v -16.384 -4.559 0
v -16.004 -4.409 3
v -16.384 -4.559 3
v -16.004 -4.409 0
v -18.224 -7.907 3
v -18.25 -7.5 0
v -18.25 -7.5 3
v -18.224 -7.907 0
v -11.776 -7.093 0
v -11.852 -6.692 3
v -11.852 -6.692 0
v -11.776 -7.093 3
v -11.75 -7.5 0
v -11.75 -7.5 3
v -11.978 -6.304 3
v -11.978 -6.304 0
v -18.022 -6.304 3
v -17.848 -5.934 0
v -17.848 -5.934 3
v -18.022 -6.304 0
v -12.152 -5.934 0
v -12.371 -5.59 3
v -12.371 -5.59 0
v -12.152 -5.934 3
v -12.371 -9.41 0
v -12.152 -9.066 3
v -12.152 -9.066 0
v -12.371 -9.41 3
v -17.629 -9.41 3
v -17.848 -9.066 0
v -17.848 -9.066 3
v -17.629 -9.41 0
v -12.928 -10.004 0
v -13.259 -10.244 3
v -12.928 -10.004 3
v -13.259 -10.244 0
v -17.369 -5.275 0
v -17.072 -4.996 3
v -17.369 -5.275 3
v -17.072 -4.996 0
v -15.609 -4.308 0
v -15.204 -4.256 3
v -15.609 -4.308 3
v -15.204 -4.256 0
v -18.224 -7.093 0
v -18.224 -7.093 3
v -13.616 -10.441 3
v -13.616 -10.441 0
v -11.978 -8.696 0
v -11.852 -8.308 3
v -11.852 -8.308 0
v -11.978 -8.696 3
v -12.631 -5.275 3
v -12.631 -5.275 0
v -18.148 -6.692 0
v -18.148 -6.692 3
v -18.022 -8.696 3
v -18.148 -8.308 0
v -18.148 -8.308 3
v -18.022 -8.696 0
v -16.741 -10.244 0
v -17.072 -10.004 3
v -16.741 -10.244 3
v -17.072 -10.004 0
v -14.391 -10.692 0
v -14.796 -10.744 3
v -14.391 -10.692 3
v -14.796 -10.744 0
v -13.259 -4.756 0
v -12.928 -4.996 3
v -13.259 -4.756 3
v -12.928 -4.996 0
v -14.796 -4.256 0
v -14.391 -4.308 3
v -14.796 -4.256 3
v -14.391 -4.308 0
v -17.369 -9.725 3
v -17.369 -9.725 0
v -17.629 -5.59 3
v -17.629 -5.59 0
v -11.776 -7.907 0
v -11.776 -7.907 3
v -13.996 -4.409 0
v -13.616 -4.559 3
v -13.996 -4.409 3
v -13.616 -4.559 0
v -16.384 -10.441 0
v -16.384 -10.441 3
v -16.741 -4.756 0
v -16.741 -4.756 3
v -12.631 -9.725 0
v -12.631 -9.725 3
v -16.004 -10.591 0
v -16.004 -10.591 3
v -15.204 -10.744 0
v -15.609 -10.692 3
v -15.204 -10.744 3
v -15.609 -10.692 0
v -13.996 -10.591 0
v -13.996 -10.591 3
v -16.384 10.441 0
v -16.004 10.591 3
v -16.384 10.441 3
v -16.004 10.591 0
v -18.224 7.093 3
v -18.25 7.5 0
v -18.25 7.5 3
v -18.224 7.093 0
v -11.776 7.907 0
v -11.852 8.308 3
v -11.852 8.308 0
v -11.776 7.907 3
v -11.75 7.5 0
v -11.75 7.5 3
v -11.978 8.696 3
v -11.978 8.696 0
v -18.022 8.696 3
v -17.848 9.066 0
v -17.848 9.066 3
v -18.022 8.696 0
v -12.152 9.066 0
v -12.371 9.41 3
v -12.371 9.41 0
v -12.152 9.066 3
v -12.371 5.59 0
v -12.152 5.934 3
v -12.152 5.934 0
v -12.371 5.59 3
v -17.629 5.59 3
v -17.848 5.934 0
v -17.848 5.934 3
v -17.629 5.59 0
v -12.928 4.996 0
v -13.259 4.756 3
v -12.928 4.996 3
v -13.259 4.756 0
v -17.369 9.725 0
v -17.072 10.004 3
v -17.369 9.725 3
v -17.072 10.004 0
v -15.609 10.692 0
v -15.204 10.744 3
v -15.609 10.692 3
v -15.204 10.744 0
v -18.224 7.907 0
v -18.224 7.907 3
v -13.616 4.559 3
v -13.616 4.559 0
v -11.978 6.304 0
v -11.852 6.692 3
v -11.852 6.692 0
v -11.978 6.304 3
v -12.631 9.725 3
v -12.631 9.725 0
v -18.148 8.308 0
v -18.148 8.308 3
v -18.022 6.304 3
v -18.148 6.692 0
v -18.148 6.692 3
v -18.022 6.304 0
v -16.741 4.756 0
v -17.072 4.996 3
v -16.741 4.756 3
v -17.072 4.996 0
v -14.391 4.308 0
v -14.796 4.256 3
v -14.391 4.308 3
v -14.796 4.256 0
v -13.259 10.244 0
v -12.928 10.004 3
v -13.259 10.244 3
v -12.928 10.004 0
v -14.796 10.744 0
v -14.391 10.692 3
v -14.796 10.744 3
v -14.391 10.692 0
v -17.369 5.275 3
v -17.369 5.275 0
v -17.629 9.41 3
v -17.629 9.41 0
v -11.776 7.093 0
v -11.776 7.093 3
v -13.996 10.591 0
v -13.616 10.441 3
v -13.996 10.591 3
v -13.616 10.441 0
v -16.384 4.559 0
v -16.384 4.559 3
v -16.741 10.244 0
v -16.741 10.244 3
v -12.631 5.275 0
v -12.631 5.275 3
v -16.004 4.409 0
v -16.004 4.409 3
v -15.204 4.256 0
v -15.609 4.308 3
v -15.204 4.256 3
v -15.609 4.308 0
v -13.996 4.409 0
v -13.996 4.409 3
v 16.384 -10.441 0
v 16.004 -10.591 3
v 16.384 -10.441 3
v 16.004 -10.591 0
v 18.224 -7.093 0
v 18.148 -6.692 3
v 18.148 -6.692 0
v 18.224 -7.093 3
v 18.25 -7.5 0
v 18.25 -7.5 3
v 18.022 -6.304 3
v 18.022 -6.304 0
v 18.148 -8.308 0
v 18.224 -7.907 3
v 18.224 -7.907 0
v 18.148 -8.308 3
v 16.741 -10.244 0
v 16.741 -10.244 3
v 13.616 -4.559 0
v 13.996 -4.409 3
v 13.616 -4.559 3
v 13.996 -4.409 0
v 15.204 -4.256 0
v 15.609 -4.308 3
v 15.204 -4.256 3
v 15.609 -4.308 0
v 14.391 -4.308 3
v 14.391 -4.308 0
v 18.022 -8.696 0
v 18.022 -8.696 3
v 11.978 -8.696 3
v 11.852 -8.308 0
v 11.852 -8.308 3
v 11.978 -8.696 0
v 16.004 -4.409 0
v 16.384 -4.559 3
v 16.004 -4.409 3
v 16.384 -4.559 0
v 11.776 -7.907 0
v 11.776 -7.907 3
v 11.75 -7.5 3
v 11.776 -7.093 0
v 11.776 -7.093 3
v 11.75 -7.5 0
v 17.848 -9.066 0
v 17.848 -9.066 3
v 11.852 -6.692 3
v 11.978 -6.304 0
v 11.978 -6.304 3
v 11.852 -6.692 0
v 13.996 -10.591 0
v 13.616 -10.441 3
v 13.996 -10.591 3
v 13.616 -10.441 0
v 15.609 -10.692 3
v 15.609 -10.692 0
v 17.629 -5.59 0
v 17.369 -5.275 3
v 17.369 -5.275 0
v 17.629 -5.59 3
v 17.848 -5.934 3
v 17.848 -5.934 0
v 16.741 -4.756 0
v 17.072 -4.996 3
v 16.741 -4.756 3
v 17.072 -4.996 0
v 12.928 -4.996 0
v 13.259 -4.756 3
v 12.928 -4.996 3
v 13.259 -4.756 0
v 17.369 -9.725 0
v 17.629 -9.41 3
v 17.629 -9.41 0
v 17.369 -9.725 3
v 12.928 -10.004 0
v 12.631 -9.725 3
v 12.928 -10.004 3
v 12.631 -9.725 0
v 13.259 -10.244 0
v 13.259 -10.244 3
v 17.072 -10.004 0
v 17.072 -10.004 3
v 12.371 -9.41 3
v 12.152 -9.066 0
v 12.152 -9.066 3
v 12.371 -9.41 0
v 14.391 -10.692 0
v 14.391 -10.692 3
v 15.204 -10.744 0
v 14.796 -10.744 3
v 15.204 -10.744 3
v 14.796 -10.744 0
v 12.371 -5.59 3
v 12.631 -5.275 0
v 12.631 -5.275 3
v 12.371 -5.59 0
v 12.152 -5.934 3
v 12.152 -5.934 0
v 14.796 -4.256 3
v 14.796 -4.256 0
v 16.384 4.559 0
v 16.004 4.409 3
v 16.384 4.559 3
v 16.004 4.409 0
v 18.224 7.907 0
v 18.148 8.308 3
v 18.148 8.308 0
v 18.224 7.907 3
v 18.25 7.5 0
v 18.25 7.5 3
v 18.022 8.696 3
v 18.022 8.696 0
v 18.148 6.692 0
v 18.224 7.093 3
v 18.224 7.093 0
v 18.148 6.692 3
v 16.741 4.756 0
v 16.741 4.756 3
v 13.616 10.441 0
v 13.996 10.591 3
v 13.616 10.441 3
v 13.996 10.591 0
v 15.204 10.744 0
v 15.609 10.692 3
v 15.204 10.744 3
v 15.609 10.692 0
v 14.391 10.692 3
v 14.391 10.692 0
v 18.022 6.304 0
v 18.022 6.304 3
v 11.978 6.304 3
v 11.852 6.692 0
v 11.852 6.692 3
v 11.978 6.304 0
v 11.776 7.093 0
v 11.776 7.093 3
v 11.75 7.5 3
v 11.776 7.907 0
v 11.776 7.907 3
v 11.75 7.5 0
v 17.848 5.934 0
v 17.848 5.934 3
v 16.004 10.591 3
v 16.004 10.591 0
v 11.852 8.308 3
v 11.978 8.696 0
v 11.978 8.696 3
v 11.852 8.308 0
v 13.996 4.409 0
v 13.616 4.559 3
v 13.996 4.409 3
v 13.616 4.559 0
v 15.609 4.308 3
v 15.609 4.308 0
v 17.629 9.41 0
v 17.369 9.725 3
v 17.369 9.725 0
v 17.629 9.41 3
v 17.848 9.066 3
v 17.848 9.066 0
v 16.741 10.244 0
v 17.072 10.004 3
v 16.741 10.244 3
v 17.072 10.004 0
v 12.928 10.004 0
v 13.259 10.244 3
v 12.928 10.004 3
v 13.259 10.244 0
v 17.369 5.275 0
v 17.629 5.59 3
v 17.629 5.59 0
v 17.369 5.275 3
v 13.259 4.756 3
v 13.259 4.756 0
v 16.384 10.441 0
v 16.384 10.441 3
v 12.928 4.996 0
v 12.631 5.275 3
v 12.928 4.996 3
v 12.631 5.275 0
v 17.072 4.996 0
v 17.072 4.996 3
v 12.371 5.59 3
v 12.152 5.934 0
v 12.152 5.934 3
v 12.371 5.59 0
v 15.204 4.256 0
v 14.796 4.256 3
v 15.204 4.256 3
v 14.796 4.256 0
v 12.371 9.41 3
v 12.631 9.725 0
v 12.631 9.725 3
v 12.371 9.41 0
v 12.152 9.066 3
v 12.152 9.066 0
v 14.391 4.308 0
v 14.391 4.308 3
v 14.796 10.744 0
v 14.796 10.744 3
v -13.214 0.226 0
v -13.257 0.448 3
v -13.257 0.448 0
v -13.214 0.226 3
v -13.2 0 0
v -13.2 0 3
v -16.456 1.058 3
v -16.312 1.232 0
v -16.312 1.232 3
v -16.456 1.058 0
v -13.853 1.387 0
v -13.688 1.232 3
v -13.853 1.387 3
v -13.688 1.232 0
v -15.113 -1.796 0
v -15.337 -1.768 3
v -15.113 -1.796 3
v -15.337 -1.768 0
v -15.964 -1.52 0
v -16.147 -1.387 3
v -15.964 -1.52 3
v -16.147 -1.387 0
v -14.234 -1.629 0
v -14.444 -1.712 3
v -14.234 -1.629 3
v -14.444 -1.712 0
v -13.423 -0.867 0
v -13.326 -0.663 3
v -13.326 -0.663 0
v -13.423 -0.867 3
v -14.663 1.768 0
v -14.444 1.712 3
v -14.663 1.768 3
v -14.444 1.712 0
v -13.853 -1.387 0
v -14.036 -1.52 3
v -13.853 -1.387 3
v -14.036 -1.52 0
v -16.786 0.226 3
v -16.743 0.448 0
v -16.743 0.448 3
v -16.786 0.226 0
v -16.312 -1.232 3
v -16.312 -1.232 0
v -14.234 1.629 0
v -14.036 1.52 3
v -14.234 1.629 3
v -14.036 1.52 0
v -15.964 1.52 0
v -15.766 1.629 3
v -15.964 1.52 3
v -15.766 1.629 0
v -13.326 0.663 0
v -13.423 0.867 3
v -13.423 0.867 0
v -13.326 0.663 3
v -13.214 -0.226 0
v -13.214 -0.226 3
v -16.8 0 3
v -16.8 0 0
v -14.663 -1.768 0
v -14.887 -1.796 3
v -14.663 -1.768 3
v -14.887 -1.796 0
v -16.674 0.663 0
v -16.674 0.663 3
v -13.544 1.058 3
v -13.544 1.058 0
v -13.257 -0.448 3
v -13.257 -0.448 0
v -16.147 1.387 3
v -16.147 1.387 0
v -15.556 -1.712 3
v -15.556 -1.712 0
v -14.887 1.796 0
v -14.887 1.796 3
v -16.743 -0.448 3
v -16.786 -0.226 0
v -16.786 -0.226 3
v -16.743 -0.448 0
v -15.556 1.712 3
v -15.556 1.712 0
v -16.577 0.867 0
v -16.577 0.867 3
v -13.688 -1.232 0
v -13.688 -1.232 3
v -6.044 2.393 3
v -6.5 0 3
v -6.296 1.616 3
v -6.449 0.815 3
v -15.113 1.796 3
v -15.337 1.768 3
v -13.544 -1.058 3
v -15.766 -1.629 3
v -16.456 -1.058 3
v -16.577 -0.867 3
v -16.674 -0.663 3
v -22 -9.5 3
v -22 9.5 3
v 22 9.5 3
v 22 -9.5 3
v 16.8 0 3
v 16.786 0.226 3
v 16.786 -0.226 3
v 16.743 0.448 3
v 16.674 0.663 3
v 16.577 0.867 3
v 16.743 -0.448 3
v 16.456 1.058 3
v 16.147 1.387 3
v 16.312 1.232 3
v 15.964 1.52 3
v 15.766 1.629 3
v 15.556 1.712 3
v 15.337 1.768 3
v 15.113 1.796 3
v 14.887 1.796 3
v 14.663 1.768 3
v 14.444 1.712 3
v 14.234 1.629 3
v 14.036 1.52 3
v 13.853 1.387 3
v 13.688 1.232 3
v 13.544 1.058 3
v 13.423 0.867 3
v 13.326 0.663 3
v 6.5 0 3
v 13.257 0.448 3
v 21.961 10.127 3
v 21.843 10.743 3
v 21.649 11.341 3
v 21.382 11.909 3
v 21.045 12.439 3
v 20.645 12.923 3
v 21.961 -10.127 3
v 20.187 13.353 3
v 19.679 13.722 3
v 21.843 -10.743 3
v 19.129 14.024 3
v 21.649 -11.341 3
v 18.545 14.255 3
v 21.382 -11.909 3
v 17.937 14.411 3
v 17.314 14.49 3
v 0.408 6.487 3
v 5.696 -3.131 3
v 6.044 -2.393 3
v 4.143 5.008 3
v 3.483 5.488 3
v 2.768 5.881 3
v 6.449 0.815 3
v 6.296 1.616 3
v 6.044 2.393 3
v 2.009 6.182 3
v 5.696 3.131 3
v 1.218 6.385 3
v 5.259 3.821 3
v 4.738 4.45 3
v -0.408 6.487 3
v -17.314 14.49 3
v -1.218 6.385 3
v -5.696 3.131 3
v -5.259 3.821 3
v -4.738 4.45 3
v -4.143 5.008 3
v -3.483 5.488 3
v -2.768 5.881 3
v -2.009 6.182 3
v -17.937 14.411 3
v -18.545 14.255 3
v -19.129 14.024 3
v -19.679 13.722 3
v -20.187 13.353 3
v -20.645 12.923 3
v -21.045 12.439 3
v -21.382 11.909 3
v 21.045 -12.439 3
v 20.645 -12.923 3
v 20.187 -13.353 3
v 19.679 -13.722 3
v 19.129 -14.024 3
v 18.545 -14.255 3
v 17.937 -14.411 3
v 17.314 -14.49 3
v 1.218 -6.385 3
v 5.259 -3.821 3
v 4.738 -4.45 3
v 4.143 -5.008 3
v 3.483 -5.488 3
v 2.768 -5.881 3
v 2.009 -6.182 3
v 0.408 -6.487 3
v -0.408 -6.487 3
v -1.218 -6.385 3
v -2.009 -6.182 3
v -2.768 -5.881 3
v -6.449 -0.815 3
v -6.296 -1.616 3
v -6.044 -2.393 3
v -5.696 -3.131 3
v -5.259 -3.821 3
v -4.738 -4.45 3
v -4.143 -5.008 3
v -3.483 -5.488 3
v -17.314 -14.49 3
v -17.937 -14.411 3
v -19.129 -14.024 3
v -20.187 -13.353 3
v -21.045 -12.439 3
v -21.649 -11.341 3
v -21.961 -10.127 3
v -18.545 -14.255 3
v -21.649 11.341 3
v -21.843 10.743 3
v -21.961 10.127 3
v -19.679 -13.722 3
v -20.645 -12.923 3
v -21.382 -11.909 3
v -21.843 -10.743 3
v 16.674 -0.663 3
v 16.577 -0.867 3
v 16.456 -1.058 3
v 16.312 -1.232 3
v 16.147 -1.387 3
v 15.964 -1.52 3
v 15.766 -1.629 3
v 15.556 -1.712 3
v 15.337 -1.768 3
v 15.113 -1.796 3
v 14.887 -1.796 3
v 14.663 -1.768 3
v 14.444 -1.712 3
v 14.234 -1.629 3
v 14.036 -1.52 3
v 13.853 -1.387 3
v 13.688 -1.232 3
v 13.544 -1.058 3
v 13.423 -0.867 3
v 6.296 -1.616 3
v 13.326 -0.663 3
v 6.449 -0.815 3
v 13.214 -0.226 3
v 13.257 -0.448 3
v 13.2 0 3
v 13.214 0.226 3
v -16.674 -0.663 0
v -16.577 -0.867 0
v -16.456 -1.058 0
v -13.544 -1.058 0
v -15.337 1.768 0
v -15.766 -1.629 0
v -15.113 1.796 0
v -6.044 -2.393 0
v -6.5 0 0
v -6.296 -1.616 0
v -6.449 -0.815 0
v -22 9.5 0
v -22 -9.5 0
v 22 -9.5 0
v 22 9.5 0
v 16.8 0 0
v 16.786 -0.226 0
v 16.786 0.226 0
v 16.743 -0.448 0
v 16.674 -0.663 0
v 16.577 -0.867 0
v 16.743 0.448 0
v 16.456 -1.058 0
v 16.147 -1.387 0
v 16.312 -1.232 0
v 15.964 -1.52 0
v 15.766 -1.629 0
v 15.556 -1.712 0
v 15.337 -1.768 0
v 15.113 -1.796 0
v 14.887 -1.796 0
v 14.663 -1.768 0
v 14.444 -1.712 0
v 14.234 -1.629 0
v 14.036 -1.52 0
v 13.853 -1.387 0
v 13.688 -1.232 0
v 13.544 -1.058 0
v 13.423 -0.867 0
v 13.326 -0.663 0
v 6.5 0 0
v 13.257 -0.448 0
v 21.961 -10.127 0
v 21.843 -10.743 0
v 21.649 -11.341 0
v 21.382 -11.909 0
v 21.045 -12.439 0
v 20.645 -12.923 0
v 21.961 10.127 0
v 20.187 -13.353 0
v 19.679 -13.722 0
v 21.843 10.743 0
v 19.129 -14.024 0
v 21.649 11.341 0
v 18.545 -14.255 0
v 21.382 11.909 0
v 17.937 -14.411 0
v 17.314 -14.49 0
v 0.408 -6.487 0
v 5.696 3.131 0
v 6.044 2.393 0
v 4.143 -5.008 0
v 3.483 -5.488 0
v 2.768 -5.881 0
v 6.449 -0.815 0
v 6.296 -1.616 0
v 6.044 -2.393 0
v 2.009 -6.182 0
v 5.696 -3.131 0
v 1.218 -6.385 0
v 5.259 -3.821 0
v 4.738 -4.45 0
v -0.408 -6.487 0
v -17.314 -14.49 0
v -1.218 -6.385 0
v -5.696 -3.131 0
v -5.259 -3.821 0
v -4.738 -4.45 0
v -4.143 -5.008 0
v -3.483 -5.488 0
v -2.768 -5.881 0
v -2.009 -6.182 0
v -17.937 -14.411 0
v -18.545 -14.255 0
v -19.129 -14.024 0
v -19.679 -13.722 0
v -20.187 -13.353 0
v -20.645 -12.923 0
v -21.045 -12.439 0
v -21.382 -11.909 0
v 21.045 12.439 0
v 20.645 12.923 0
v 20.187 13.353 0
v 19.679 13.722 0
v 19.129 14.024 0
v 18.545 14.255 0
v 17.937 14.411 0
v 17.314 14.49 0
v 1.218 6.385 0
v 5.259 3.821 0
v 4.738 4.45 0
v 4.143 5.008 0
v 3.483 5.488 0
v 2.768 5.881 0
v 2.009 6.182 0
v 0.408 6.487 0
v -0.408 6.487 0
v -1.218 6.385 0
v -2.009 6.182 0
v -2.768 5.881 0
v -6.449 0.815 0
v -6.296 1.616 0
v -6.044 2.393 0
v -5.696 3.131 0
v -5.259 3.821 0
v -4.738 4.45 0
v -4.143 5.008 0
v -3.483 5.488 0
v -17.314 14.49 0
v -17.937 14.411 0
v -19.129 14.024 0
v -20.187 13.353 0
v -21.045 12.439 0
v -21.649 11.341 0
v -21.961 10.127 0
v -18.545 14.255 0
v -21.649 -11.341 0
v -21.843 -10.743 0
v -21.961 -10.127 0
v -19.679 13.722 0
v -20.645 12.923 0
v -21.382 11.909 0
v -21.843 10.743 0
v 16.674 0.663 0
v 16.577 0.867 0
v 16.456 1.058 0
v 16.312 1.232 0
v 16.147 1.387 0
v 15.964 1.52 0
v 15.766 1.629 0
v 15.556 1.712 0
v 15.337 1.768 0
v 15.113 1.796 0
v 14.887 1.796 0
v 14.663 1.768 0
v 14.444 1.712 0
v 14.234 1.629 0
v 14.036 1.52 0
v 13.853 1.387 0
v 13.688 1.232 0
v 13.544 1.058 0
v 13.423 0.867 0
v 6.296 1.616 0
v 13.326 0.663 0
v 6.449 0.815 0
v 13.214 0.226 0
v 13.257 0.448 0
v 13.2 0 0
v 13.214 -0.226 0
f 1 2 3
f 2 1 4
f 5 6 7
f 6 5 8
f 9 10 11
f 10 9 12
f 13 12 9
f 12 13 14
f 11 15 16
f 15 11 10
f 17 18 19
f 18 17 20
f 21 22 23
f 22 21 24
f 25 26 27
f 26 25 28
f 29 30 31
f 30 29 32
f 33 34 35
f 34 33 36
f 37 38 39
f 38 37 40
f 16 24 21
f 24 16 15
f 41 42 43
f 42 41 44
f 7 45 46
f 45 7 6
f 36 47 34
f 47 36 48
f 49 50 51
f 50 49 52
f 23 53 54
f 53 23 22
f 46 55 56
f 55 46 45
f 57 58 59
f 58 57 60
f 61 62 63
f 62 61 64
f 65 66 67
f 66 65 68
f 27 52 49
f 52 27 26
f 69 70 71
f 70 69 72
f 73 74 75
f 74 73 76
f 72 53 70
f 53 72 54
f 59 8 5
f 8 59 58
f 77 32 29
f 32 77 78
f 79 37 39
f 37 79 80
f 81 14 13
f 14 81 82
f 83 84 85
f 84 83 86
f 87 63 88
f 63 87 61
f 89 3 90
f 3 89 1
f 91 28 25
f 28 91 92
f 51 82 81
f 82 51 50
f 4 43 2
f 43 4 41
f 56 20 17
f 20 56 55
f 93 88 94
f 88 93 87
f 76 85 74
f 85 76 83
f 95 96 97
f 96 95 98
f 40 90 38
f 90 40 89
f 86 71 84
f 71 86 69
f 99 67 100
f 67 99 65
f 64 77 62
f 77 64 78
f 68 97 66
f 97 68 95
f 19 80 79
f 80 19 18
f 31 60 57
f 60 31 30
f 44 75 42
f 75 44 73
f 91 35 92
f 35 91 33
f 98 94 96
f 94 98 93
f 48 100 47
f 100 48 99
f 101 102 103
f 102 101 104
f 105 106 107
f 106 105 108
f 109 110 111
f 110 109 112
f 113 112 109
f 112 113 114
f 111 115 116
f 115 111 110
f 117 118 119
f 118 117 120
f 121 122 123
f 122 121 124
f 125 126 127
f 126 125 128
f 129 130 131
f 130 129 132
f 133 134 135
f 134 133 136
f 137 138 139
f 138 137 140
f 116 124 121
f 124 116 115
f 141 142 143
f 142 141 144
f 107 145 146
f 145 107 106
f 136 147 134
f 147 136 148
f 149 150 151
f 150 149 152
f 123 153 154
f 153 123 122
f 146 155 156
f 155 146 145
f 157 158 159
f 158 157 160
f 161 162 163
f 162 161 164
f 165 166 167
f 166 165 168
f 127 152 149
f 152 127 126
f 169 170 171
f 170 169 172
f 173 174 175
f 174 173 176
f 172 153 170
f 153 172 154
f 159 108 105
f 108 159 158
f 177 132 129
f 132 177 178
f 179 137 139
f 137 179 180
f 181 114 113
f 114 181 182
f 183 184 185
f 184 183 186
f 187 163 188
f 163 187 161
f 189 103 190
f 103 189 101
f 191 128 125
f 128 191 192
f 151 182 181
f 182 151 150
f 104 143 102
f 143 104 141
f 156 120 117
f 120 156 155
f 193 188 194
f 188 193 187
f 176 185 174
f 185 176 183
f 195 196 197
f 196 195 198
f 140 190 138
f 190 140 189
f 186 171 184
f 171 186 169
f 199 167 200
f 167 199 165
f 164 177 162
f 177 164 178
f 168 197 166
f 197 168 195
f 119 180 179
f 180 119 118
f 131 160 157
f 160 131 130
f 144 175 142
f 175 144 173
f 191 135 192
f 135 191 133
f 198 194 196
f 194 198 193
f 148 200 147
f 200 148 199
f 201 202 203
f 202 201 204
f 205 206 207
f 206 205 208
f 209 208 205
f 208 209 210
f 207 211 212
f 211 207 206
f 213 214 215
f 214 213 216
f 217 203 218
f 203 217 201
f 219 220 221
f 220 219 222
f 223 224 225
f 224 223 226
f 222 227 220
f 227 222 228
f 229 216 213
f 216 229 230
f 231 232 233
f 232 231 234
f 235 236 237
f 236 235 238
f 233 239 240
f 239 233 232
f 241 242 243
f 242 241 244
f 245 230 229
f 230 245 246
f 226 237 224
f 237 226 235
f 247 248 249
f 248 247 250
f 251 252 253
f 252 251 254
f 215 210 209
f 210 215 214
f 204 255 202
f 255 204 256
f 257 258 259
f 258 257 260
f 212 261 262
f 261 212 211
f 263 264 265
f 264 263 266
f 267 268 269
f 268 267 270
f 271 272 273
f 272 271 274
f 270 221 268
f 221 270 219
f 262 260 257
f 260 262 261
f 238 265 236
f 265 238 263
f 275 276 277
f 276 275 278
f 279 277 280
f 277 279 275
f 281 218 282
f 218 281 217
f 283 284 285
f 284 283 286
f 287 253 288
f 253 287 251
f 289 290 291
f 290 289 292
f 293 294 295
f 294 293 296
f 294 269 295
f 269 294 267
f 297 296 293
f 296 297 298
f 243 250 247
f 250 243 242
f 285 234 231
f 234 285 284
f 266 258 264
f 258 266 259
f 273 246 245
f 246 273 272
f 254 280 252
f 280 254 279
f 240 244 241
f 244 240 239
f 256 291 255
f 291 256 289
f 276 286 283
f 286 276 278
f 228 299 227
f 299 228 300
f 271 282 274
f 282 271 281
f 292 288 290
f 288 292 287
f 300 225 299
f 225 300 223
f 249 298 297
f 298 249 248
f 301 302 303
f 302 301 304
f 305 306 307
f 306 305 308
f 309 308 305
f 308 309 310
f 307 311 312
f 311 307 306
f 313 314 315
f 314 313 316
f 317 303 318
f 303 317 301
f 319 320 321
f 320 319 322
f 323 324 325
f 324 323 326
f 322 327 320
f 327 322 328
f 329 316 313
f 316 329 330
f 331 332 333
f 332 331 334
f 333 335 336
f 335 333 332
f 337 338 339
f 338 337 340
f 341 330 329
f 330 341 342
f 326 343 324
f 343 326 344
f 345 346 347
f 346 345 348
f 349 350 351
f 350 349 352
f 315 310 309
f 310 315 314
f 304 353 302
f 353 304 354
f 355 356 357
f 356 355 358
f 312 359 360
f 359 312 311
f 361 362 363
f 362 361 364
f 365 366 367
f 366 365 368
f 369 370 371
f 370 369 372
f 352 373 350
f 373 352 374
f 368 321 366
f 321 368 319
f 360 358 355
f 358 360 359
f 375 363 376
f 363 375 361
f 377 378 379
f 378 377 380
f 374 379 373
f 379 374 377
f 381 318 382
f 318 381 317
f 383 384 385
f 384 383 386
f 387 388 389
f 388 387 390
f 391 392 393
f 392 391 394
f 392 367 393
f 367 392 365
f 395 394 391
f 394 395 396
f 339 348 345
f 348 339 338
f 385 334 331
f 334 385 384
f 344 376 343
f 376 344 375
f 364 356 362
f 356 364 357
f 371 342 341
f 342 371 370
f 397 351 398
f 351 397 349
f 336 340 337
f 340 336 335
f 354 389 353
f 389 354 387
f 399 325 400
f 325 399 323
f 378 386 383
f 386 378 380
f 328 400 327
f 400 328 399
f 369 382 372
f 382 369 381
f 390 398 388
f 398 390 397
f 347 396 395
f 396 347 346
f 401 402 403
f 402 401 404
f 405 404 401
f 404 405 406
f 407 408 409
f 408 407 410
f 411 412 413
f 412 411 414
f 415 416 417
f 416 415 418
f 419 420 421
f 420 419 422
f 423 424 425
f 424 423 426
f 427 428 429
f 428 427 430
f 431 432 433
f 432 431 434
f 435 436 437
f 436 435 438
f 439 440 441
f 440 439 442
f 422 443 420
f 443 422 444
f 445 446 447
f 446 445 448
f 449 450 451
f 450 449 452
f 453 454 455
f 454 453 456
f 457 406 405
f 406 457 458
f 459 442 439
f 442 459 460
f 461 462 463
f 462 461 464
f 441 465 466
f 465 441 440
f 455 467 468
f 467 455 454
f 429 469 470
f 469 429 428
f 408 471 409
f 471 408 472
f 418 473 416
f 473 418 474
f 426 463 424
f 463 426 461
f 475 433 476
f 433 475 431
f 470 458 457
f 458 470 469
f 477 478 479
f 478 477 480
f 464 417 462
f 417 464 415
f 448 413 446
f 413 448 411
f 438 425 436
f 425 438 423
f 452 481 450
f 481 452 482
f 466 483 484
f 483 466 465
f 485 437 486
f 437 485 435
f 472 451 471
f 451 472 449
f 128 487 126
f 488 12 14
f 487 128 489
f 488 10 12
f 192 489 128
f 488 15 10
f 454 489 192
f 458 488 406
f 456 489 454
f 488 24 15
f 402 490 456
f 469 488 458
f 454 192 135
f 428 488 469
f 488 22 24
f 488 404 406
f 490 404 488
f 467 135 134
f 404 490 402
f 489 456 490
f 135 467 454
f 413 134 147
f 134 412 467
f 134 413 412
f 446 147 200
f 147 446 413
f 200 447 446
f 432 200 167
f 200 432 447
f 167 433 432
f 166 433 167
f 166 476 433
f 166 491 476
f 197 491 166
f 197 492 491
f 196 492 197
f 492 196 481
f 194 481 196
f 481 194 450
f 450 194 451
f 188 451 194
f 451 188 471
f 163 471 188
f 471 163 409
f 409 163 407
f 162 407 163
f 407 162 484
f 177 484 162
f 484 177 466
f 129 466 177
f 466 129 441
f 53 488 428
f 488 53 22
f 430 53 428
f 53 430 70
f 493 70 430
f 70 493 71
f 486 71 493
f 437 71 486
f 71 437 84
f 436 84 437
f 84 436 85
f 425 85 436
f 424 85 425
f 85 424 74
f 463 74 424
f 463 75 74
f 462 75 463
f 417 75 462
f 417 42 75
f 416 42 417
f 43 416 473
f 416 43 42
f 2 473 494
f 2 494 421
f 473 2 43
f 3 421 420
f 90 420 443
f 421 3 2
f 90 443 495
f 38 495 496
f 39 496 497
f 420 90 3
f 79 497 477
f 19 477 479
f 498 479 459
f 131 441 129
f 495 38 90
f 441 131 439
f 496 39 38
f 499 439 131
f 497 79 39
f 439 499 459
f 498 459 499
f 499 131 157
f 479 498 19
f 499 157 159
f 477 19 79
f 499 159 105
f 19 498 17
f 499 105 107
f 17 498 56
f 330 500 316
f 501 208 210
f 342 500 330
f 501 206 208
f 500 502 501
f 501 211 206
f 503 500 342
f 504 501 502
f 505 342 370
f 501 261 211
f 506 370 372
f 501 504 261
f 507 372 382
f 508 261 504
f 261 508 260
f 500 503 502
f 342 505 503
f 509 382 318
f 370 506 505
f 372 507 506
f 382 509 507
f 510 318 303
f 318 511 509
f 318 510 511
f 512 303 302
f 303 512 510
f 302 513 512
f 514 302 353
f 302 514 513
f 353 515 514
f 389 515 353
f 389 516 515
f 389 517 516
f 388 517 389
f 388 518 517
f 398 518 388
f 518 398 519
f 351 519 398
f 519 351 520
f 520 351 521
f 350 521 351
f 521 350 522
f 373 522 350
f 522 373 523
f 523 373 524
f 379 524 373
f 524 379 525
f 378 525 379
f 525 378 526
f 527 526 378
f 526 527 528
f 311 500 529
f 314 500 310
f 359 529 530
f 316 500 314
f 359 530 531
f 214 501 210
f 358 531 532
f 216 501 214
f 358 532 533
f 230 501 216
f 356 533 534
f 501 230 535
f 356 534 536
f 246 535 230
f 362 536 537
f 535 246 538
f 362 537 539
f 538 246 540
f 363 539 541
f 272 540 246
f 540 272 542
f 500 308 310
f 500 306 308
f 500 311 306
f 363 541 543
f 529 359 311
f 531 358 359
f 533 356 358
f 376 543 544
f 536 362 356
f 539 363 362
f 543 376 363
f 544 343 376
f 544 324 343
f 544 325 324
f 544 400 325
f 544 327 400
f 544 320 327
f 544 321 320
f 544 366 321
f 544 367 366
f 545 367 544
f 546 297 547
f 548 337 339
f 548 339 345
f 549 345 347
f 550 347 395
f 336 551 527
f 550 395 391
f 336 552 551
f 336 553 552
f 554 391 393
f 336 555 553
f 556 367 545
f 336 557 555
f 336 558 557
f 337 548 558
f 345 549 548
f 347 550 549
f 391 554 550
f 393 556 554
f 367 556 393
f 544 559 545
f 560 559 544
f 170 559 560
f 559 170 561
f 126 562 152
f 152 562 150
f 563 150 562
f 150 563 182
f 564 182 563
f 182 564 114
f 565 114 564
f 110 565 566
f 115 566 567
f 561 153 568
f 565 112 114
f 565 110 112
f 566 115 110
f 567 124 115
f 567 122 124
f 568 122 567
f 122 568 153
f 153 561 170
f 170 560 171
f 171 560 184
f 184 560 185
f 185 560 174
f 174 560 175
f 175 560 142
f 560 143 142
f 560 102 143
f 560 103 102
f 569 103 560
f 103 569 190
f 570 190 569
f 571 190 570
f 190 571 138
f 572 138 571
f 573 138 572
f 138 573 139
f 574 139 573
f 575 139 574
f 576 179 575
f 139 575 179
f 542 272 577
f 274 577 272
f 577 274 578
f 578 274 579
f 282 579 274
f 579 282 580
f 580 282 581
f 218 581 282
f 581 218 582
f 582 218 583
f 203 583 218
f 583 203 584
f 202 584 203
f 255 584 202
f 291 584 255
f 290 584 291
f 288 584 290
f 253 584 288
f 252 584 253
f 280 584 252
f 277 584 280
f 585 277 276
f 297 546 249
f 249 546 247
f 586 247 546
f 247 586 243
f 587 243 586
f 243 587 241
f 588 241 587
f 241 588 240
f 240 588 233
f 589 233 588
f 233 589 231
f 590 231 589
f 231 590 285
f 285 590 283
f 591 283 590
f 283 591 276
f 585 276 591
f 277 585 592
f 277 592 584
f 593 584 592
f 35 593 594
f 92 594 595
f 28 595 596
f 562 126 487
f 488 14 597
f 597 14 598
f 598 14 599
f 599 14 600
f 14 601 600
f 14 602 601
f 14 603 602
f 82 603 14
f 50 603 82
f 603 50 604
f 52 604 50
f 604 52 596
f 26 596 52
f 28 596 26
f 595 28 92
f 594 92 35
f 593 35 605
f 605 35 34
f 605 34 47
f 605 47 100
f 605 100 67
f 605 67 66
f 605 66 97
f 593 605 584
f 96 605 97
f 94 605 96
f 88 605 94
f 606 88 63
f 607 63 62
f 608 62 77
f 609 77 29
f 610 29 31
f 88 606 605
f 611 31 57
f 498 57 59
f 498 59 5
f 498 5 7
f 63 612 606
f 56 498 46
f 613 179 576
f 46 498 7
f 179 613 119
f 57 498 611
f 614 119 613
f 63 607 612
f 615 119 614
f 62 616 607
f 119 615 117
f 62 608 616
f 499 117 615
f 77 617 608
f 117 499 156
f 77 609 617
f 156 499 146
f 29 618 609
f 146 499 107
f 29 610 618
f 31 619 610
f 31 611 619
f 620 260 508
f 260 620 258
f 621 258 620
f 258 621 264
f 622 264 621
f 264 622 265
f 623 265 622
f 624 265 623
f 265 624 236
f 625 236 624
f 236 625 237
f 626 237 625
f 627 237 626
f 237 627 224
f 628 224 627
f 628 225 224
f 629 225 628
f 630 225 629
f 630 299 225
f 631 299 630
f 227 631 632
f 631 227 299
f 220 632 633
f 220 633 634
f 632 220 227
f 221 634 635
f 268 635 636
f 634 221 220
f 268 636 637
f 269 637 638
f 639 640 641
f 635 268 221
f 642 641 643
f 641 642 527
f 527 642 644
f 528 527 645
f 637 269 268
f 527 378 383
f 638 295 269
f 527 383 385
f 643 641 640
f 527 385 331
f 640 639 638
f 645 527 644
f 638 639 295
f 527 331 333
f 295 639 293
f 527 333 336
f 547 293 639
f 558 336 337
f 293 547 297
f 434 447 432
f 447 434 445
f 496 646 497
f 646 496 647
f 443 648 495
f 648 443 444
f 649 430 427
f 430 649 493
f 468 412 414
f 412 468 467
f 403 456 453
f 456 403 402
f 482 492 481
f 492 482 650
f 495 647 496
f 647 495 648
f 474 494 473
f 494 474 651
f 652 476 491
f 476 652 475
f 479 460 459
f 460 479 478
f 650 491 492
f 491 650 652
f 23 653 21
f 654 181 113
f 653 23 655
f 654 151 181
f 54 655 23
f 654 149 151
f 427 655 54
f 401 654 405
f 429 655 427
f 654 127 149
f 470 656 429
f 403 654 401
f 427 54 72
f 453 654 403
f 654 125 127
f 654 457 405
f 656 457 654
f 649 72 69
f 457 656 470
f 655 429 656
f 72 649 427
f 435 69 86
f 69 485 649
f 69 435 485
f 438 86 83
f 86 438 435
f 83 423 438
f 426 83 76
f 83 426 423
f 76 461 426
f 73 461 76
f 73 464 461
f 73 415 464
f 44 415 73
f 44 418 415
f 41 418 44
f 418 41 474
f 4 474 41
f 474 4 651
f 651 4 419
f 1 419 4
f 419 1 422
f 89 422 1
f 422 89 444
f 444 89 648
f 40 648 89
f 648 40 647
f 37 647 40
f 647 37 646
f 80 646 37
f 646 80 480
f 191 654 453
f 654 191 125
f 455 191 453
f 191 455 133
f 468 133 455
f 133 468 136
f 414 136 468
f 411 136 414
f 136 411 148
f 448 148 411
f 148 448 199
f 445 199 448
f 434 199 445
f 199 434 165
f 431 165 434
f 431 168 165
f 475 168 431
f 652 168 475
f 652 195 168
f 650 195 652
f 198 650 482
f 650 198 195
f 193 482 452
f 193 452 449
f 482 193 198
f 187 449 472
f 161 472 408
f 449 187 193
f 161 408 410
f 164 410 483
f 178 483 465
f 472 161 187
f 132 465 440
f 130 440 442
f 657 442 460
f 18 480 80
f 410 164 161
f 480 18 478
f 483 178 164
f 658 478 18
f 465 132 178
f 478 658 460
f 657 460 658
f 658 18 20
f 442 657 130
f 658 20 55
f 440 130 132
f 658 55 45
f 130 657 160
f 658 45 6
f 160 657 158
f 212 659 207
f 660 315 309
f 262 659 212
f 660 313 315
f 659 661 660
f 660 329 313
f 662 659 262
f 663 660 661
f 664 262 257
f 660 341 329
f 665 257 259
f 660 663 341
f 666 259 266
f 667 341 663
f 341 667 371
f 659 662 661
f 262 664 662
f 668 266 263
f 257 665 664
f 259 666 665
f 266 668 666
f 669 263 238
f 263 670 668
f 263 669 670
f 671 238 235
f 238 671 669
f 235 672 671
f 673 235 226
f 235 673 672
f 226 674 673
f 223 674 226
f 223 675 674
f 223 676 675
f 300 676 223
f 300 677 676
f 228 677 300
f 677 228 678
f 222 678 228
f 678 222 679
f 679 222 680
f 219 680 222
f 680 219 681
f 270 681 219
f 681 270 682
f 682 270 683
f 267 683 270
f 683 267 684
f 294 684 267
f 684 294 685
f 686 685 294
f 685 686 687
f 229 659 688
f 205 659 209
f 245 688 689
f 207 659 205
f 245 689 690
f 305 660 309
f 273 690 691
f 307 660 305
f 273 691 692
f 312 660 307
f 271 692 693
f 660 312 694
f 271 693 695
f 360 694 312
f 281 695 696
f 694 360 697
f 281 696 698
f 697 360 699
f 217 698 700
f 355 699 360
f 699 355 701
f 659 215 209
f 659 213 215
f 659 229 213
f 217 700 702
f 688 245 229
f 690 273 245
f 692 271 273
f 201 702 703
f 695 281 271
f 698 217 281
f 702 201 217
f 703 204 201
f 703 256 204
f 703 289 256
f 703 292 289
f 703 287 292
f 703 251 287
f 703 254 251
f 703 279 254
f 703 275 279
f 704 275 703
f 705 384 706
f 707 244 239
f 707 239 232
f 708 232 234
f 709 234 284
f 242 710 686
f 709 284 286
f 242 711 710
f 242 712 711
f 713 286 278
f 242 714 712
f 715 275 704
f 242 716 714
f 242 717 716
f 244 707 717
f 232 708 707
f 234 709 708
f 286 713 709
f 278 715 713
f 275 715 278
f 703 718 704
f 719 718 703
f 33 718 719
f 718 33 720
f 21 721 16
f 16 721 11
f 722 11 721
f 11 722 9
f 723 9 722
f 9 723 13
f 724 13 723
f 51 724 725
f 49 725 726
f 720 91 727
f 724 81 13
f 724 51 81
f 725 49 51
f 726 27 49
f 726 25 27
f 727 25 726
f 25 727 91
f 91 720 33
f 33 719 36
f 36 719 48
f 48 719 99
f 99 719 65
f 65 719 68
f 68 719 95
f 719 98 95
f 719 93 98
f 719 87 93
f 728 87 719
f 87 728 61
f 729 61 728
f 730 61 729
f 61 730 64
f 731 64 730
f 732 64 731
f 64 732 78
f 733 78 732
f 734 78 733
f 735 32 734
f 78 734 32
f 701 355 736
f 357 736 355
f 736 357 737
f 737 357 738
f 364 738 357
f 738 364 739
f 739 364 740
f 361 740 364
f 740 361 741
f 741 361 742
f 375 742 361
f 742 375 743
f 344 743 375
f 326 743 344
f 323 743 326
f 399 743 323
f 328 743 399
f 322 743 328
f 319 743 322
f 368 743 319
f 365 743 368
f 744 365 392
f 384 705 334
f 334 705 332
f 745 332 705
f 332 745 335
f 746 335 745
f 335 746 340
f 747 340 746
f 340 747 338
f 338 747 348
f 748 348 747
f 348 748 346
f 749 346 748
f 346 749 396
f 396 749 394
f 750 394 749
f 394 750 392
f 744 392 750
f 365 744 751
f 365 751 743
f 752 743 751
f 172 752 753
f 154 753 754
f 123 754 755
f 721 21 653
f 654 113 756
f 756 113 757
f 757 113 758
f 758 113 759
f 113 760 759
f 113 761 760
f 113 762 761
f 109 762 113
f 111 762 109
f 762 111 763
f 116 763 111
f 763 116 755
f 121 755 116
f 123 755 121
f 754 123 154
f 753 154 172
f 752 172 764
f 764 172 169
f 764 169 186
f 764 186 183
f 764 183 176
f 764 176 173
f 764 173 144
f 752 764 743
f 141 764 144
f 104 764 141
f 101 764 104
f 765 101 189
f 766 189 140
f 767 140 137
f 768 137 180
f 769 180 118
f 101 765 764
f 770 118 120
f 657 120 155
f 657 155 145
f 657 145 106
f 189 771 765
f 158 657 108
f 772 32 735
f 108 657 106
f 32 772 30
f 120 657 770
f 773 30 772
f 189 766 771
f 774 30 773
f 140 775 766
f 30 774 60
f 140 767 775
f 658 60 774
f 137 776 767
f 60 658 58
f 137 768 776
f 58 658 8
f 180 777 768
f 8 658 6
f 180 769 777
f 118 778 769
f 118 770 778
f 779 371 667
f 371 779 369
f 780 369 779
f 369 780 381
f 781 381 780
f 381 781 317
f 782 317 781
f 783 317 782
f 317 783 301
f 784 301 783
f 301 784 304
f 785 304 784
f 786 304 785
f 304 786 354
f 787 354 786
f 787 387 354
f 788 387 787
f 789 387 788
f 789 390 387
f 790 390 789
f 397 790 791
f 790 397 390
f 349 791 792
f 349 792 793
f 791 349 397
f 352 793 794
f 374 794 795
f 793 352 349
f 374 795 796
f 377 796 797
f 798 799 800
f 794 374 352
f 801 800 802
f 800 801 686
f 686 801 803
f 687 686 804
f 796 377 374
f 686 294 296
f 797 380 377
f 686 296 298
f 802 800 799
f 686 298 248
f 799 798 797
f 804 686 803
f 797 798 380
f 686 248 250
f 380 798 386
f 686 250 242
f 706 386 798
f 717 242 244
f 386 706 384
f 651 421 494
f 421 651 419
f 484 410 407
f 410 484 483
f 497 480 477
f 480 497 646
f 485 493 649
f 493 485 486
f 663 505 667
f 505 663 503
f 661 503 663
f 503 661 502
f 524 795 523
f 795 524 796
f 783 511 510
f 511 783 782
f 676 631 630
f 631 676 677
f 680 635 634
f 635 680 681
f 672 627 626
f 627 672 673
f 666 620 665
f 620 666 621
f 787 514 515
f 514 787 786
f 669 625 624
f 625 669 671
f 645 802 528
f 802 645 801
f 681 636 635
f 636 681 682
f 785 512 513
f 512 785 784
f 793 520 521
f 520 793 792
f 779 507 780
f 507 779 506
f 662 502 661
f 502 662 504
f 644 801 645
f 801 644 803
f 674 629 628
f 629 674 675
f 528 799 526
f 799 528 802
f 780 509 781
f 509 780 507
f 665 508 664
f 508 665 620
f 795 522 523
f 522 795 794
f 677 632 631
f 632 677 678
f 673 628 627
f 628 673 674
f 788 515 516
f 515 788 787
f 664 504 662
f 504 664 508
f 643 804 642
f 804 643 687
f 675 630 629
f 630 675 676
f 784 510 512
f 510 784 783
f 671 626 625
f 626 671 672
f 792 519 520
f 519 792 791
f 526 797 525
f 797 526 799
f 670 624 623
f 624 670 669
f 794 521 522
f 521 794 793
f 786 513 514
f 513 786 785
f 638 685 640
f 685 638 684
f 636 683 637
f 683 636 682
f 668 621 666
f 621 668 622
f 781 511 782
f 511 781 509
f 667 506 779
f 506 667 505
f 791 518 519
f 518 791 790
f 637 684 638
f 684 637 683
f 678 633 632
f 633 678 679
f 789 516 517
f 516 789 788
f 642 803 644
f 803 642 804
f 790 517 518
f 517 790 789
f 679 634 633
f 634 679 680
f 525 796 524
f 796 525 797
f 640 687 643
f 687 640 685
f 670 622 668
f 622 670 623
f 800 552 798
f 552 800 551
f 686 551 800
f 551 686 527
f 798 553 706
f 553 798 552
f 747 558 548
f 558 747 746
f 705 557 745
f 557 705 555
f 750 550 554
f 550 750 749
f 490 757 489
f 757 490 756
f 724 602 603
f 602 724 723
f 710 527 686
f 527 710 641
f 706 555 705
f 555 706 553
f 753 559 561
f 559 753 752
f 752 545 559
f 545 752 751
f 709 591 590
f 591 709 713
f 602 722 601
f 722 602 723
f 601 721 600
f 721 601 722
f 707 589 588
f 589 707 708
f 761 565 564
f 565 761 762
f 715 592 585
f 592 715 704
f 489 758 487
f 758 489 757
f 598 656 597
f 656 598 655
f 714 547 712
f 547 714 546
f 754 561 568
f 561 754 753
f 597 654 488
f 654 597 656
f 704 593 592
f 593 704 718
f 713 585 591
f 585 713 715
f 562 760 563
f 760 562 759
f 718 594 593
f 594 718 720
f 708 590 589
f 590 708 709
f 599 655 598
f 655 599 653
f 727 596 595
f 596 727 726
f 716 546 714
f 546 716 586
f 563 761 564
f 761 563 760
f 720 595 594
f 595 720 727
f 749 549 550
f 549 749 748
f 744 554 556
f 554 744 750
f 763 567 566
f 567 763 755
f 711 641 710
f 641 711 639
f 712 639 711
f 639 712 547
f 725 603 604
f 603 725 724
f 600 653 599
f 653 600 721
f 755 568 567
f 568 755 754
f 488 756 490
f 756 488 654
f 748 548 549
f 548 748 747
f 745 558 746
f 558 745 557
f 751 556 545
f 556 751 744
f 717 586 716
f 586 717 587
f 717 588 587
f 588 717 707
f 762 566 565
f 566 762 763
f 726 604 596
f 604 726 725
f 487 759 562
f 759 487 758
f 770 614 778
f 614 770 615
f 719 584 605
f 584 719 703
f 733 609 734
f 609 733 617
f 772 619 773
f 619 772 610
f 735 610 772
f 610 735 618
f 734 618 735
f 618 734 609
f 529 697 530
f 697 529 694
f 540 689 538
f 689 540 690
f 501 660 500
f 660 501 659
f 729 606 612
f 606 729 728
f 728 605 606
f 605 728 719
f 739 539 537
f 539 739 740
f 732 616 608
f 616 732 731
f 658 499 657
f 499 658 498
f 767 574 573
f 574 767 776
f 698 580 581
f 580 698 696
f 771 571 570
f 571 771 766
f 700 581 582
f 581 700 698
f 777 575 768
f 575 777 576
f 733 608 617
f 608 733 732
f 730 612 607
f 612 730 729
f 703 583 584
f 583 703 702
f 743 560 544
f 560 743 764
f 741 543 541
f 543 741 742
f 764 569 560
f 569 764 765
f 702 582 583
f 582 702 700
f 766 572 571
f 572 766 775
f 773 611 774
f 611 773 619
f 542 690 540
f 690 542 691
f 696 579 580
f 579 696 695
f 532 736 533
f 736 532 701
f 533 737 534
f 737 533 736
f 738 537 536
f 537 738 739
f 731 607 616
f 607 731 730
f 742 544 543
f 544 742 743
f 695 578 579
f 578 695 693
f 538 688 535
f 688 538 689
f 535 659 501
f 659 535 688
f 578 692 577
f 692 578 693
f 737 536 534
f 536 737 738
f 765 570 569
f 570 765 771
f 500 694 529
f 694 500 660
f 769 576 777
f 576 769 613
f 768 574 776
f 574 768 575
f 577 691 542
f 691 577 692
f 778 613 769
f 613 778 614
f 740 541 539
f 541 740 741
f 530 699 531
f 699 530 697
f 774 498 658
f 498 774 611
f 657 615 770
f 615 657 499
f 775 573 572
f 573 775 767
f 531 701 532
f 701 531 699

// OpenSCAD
$fn = 50;


difference() {
	union() {
		hull() {
			translate(v = [-17.0000000000, 9.5000000000, 0]) {
				cylinder(h = 3, r = 5);
			}
			translate(v = [17.0000000000, 9.5000000000, 0]) {
				cylinder(h = 3, r = 5);
			}
			translate(v = [-17.0000000000, -9.5000000000, 0]) {
				cylinder(h = 3, r = 5);
			}
			translate(v = [17.0000000000, -9.5000000000, 0]) {
				cylinder(h = 3, r = 5);
			}
		}
	}
	union() {
		#translate(v = [-15.0000000000, -7.5000000000, 0]) {
			cylinder(h = 3, r = 3.2500000000);
		}
		#translate(v = [-15.0000000000, 7.5000000000, 0]) {
			cylinder(h = 3, r = 3.2500000000);
		}
		#translate(v = [15.0000000000, -7.5000000000, 0]) {
			cylinder(h = 3, r = 3.2500000000);
		}
		#translate(v = [15.0000000000, 7.5000000000, 0]) {
			cylinder(h = 3, r = 3.2500000000);
		}
		#translate(v = [-15.0000000000, -7.5000000000, -100.0000000000]) {
			cylinder(h = 200, r = 3.2500000000);
		}
		#translate(v = [-15.0000000000, 7.5000000000, -100.0000000000]) {
			cylinder(h = 200, r = 3.2500000000);
		}
		#translate(v = [15.0000000000, -7.5000000000, -100.0000000000]) {
			cylinder(h = 200, r = 3.2500000000);
		}
		#translate(v = [15.0000000000, 7.5000000000, -100.0000000000]) {
			cylinder(h = 200, r = 3.2500000000);
		}
		#translate(v = [-15.0000000000, -7.5000000000, 0]) {
			cylinder(h = 3, r = 1.8000000000);
		}
		#translate(v = [-15.0000000000, 0.0000000000, 0]) {
			cylinder(h = 3, r = 1.8000000000);
		}
		#translate(v = [-15.0000000000, 7.5000000000, 0]) {
			cylinder(h = 3, r = 1.8000000000);
		}
		#translate(v = [15.0000000000, -7.5000000000, 0]) {
			cylinder(h = 3, r = 1.8000000000);
		}
		#translate(v = [15.0000000000, 0.0000000000, 0]) {
			cylinder(h = 3, r = 1.8000000000);
		}
		#translate(v = [15.0000000000, 7.5000000000, 0]) {
			cylinder(h = 3, r = 1.8000000000);
		}
		#translate(v = [-15.0000000000, -7.5000000000, 0]) {
			cylinder(h = 3, r = 1.8000000000);
		}
		#translate(v = [-15.0000000000, 0.0000000000, 0]) {
			cylinder(h = 3, r = 1.8000000000);
		}
		#translate(v = [-15.0000000000, 7.5000000000, 0]) {
			cylinder(h = 3, r = 1.8000000000);
		}
		#translate(v = [15.0000000000, -7.5000000000, 0]) {
			cylinder(h = 3, r = 1.8000000000);
		}
		#translate(v = [15.0000000000, 0.0000000000, 0]) {
			cylinder(h = 3, r = 1.8000000000);
		}
		#translate(v = [15.0000000000, 7.5000000000, 0]) {
			cylinder(h = 3, r = 1.8000000000);
		}
		#translate(v = [-15.0000000000, -7.5000000000, 0]) {
			cylinder(h = 3, r = 1.8000000000);
		}
		#translate(v = [-15.0000000000, 0.0000000000, 0]) {
			cylinder(h = 3, r = 1.8000000000);
		}
		#translate(v = [-15.0000000000, 7.5000000000, 0]) {
			cylinder(h = 3, r = 1.8000000000);
		}
		#translate(v = [15.0000000000, -7.5000000000, 0]) {
			cylinder(h = 3, r = 1.8000000000);
		}
		#translate(v = [15.0000000000, 0.0000000000, 0]) {
			cylinder(h = 3, r = 1.8000000000);
		}
		#translate(v = [15.0000000000, 7.5000000000, 0]) {
			cylinder(h = 3, r = 1.8000000000);
		}
		#cylinder(h = 3, r = 6.5000000000);
	}
}
